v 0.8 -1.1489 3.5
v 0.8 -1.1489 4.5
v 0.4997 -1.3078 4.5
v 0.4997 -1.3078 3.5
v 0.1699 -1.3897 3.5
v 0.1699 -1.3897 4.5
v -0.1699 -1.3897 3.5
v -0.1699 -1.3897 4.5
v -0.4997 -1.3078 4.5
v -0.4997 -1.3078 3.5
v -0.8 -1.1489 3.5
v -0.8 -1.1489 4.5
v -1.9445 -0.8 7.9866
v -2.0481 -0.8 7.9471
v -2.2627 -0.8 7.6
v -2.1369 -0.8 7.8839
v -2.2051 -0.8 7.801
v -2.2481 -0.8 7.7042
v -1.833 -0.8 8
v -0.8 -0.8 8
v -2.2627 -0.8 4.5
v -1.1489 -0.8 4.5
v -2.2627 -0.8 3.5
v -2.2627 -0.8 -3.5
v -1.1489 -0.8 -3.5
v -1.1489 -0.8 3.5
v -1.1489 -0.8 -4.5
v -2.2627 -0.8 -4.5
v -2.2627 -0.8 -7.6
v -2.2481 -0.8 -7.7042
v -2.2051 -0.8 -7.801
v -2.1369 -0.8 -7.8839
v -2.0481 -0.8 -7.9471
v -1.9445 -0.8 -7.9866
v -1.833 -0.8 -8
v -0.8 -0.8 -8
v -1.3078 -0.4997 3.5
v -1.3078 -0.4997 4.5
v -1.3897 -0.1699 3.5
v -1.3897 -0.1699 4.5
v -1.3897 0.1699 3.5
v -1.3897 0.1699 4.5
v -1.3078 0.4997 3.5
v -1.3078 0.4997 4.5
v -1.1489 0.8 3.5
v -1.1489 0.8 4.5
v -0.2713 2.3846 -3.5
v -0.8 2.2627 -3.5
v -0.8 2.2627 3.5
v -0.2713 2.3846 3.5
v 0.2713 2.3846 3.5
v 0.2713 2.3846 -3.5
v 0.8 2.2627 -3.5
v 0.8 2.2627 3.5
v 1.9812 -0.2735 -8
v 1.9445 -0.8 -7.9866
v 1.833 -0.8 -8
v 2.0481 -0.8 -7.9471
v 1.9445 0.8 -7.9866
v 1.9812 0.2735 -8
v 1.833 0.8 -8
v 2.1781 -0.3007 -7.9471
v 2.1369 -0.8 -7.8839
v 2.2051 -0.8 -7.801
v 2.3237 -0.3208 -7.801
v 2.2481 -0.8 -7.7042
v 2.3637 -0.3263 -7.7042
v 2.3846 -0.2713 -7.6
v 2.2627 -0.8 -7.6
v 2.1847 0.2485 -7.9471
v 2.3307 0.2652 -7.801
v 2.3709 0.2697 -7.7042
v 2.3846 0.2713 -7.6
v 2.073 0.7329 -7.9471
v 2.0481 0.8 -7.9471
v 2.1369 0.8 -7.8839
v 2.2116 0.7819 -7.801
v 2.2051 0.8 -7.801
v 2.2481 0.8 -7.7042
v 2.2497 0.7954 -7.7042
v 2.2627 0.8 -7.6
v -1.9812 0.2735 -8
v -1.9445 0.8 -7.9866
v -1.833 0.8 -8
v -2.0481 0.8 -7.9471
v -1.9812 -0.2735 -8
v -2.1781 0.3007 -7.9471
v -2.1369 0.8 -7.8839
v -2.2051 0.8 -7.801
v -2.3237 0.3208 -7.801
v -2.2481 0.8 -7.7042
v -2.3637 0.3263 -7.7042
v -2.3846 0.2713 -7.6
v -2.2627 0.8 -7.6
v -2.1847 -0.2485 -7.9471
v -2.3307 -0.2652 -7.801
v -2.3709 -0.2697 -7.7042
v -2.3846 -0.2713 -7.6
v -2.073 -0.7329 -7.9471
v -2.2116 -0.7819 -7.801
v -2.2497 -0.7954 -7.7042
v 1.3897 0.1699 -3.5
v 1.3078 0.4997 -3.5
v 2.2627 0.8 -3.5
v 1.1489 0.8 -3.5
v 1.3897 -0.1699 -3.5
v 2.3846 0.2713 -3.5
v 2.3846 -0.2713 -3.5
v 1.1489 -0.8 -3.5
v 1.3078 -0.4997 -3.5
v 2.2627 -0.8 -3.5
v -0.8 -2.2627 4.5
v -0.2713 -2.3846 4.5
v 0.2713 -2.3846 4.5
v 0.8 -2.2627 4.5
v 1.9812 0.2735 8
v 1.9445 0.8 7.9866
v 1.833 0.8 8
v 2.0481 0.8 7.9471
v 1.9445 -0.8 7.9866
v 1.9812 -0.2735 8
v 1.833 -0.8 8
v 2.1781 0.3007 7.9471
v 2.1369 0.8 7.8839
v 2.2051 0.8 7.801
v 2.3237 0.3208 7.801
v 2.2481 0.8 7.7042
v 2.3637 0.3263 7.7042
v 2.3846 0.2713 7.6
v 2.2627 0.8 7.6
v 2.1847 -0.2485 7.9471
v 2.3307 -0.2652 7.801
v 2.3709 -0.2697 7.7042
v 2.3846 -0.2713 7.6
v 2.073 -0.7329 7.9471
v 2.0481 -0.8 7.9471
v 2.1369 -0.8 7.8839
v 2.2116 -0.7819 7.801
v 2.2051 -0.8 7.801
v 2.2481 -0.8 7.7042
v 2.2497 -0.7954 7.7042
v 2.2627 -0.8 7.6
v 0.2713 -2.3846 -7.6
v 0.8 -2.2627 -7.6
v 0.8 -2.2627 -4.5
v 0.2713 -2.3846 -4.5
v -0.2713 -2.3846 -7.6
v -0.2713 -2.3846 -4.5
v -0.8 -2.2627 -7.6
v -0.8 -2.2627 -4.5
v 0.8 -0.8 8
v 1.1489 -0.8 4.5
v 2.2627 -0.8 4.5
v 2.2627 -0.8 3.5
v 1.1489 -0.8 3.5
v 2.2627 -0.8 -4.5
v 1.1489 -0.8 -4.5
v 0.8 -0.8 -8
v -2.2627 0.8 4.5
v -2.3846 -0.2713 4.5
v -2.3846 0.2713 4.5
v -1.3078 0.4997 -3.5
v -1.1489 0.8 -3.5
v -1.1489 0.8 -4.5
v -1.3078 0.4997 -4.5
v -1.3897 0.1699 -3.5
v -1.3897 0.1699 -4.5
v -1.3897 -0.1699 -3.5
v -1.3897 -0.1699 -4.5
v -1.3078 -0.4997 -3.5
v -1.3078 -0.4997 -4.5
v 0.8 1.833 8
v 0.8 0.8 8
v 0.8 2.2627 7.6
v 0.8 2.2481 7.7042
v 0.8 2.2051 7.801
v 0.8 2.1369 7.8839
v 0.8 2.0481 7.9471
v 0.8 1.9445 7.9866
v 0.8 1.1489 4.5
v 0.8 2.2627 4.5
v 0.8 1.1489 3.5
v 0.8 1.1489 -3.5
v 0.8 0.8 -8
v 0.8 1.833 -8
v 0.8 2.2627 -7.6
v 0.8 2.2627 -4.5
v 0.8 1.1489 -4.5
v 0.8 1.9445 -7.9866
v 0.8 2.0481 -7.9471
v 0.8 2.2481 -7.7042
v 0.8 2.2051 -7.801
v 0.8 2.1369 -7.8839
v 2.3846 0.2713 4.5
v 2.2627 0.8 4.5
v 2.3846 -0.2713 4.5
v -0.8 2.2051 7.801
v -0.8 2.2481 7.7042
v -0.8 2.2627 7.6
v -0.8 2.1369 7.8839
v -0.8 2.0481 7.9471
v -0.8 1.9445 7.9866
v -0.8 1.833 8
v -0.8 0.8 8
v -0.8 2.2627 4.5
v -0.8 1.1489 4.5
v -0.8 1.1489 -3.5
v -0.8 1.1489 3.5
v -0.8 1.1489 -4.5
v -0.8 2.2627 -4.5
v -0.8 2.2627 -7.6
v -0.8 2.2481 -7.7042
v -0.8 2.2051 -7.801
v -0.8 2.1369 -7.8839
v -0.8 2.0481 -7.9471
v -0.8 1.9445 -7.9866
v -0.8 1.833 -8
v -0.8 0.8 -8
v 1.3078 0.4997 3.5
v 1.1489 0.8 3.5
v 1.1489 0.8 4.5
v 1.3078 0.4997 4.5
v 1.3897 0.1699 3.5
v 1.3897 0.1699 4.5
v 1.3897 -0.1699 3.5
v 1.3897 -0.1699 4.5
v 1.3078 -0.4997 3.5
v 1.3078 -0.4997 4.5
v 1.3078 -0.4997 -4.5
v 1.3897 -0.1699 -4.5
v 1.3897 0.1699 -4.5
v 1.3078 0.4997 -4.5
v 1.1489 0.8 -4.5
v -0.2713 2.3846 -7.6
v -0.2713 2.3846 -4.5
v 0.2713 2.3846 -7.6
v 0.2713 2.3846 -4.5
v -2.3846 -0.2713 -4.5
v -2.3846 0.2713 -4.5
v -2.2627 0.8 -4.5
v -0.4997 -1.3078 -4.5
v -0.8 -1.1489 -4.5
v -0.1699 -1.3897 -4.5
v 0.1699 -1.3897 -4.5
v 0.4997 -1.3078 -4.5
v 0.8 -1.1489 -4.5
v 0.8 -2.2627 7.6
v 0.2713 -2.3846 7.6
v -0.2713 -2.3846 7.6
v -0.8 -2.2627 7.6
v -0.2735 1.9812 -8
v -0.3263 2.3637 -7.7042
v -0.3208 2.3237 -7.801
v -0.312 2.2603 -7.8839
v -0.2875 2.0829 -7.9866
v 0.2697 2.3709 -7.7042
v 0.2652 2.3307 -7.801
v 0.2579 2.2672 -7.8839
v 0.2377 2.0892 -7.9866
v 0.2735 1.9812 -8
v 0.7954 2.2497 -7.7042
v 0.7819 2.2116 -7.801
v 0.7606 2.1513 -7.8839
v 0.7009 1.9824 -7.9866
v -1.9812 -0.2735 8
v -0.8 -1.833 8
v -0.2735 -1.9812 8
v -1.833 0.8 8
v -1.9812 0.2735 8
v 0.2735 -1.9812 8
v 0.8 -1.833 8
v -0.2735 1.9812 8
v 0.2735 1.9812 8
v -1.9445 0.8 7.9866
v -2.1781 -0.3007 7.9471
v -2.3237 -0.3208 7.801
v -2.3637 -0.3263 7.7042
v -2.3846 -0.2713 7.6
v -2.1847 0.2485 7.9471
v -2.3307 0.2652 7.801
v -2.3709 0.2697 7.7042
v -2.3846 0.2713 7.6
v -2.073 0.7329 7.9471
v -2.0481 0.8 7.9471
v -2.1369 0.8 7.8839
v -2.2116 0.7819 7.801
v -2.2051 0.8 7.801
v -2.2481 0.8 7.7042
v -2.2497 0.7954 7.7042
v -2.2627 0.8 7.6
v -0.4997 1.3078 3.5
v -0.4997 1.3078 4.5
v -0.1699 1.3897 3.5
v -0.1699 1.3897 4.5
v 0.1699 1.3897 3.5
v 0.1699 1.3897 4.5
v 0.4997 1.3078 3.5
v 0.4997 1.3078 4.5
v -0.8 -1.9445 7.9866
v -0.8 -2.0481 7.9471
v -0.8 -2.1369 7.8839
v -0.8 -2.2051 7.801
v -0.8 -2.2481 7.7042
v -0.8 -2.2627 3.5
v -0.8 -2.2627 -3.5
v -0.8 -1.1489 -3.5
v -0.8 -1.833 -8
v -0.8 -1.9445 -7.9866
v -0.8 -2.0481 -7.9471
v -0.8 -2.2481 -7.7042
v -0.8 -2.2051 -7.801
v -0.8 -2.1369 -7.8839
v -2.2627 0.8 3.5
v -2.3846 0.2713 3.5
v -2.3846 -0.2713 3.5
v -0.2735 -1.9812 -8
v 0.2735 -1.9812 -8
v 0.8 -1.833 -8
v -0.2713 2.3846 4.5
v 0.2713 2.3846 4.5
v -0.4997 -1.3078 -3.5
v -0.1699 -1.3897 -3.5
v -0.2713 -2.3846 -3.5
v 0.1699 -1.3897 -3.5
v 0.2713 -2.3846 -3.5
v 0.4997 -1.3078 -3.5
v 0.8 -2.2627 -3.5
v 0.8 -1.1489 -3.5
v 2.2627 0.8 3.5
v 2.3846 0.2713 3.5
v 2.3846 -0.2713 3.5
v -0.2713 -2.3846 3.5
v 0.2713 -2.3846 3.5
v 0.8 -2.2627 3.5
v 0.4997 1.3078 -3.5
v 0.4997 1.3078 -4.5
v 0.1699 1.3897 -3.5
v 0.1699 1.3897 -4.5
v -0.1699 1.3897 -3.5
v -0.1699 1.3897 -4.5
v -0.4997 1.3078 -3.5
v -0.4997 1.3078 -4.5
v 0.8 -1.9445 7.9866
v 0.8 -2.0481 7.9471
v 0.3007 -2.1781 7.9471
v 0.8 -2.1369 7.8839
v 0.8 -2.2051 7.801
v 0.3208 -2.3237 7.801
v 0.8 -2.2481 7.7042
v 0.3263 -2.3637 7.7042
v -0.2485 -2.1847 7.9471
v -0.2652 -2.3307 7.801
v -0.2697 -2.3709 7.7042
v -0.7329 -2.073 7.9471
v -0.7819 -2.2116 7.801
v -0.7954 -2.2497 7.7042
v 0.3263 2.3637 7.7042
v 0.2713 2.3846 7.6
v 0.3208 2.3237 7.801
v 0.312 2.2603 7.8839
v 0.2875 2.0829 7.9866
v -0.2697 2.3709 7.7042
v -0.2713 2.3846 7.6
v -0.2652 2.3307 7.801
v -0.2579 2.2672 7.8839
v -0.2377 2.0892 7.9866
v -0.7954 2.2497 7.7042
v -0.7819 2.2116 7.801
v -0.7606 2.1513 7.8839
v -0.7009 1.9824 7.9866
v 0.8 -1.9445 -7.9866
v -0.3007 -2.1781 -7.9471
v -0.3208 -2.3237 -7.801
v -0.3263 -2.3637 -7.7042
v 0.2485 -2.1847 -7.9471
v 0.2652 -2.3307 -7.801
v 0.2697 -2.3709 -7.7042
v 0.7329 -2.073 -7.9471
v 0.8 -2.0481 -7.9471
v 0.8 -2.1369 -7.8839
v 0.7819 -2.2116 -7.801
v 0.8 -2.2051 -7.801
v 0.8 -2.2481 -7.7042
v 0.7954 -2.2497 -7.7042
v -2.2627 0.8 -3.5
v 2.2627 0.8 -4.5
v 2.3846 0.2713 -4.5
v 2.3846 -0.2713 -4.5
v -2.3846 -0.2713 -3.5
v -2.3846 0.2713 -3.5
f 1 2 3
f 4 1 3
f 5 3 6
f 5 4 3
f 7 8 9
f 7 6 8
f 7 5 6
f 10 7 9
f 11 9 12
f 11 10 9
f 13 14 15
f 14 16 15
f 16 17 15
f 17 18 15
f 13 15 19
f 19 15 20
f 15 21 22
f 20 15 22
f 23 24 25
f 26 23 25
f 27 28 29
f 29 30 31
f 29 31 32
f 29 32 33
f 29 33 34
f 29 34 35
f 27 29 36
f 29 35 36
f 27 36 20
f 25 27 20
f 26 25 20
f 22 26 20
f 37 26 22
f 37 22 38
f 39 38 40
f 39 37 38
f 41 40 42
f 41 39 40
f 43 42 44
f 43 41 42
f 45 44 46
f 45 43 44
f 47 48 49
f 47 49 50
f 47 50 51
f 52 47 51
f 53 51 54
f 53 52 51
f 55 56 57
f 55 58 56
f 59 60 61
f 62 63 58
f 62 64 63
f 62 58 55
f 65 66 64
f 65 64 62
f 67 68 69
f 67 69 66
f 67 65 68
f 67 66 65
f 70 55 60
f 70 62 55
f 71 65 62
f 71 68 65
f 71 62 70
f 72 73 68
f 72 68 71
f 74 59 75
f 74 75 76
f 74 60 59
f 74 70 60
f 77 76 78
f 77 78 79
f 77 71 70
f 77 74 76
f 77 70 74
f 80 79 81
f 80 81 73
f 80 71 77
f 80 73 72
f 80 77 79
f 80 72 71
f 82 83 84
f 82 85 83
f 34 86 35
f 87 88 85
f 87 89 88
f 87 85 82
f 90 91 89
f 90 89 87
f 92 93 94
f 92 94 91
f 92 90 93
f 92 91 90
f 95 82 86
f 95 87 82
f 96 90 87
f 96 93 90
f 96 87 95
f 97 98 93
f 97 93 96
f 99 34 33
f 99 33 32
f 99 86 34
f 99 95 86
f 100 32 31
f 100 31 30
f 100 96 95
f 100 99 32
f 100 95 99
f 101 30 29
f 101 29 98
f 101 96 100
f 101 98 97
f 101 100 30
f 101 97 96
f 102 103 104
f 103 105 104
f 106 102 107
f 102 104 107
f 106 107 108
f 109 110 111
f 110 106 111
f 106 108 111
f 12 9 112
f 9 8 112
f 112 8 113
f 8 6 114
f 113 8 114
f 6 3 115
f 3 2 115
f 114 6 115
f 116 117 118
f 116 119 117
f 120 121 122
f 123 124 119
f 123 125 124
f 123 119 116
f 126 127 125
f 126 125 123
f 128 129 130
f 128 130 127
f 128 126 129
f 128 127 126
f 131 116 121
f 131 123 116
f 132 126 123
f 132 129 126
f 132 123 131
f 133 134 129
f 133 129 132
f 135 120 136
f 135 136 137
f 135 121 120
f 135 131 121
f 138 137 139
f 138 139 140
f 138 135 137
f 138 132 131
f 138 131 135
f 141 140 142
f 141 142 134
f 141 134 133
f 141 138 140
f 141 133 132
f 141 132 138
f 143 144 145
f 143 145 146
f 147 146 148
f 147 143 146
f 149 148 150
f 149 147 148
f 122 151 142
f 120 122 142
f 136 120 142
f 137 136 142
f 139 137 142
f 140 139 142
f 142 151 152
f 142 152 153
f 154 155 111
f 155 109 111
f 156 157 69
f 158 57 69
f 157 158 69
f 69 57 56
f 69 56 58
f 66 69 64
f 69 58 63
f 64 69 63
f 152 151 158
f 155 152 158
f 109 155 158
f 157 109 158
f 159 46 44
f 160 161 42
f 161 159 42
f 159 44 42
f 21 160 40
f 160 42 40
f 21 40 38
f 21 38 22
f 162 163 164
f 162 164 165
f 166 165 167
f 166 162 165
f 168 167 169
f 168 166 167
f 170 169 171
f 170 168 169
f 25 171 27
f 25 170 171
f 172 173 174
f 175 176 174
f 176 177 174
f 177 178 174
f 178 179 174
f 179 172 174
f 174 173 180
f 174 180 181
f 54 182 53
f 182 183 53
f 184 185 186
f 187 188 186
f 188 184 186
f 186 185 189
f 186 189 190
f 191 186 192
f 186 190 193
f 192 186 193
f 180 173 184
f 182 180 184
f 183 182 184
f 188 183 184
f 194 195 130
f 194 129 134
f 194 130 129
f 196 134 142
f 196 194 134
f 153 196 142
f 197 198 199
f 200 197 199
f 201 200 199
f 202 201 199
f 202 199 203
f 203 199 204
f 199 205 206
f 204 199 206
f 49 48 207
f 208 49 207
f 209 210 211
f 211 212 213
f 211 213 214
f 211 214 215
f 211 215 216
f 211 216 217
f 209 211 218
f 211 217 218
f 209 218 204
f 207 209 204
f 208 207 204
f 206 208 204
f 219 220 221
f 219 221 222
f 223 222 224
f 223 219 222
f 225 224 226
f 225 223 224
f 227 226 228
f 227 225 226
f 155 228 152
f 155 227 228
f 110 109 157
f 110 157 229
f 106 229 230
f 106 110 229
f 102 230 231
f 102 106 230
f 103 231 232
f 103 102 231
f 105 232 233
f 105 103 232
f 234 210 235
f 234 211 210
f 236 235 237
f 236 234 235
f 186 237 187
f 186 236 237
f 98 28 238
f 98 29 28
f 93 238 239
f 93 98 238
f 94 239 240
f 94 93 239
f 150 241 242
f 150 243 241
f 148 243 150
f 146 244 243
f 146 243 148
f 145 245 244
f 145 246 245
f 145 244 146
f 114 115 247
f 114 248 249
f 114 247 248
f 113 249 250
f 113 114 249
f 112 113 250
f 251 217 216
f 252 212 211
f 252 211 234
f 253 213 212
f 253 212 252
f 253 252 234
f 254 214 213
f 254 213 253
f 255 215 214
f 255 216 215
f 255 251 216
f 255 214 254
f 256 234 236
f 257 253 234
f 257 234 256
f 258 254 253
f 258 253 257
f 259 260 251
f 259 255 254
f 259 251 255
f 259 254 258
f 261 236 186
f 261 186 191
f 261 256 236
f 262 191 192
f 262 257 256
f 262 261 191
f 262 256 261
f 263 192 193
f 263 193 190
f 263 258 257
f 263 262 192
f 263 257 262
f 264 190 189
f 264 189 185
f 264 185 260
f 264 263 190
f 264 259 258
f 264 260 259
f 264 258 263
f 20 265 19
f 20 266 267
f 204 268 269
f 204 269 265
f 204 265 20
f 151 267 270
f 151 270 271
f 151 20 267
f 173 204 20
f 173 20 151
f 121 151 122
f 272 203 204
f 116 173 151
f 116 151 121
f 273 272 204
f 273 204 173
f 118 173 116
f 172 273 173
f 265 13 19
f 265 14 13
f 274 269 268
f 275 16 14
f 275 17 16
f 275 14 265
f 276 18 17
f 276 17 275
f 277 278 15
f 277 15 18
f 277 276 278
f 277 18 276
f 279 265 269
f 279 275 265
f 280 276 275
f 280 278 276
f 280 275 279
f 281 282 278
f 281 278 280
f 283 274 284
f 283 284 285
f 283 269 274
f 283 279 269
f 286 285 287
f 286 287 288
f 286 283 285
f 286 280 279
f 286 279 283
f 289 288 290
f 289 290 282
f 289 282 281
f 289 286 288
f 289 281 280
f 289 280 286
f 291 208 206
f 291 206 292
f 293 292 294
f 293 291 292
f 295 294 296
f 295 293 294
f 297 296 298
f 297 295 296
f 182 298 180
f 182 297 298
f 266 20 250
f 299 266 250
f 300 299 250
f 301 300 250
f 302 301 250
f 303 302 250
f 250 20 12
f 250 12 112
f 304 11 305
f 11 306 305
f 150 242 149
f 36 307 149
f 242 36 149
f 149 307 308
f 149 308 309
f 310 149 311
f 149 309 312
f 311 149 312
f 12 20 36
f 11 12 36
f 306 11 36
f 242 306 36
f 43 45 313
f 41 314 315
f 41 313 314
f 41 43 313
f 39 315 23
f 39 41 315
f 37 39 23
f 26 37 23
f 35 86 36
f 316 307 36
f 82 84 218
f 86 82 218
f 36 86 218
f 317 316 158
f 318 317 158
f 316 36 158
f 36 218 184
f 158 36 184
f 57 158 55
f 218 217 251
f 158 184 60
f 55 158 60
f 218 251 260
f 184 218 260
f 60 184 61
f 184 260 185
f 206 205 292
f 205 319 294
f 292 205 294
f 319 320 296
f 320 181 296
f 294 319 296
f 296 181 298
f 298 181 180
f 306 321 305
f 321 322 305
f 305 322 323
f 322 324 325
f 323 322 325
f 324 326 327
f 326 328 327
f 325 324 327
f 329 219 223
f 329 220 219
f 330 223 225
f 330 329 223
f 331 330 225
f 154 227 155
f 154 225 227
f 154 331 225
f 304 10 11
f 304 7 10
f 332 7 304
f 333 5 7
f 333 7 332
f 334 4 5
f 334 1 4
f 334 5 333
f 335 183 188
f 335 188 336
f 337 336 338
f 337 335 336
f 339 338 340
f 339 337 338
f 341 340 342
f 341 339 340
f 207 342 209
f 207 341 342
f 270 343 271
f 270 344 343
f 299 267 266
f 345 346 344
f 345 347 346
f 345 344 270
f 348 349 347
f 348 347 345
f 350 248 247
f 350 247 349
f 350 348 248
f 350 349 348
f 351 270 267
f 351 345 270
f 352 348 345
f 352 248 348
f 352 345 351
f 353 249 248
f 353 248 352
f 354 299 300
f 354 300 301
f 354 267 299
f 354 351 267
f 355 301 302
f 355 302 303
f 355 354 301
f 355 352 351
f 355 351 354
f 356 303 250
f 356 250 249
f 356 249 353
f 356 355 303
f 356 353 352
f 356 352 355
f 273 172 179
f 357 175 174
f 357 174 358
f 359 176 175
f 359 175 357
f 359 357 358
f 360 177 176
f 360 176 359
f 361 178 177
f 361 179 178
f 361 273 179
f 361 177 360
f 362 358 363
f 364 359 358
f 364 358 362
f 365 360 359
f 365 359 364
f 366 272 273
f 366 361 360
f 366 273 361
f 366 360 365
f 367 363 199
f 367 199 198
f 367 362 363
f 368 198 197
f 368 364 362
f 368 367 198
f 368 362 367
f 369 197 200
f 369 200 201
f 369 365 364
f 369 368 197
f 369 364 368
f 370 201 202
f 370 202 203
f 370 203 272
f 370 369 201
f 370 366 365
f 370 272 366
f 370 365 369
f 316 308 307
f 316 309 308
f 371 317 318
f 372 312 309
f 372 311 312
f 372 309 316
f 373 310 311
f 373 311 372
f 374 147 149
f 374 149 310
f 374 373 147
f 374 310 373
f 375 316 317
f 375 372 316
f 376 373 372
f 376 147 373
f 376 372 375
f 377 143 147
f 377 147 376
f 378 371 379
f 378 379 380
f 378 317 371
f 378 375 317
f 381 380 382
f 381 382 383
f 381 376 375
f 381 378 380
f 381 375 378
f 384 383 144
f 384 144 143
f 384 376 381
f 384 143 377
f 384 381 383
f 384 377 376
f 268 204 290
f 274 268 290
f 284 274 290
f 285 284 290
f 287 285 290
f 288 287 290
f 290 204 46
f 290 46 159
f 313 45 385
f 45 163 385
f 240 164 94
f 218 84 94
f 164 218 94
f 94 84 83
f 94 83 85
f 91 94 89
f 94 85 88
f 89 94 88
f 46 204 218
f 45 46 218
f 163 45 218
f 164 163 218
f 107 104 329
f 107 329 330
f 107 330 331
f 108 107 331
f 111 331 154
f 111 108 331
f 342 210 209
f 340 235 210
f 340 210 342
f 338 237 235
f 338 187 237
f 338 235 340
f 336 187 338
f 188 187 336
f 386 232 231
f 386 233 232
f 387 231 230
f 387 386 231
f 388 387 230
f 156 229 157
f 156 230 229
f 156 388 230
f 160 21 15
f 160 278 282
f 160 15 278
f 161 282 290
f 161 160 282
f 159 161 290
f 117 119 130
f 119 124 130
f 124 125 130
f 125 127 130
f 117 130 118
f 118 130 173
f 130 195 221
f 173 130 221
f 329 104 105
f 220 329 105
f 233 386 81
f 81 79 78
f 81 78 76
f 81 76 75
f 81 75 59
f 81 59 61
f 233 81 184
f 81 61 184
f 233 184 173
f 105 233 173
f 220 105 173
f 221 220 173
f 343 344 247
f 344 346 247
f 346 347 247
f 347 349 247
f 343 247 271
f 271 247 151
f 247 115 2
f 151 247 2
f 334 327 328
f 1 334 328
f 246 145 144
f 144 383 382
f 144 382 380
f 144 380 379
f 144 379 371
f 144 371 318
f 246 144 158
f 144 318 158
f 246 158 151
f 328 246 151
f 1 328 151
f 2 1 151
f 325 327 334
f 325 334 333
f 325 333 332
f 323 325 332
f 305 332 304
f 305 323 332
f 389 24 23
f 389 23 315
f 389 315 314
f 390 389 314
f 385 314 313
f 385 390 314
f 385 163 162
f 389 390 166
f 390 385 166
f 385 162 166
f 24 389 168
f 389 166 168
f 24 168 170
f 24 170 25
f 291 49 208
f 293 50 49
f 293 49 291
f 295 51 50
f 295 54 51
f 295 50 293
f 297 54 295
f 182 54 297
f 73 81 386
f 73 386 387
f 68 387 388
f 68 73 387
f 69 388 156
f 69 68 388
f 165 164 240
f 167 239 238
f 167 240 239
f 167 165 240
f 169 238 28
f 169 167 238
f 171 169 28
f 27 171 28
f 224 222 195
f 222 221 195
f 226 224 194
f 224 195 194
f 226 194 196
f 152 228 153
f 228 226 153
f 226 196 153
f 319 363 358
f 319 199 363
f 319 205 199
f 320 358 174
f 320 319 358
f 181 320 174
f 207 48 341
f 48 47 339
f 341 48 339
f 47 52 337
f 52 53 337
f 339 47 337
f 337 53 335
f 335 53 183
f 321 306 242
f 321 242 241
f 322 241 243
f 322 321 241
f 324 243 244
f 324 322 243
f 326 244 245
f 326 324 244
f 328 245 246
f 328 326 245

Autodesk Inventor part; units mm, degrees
ref_plane "YZ Plane" through (0, 0, 0) normal (1, 0, 0) x (0, 1, 0)
ref_plane "XZ Plane" through (0, 0, 0) normal (0, 1, 0) x (-1, 0, 0)
ref_plane "XY Plane" through (0, 0, 0) normal (0, 0, 1) x (1, 0, 0)
sketch "Sketch1" plane through (0, 0, 0) normal (0, 0, 1) x (1, 0, 0)
  circle A0 centre (0, 0) radius 2.4 construction
  line L0 (-0.8, 2.2627) -> (-0.8, 0.8)
  line L1 (-0.8, 0.8) -> (-2.2627, 0.8)
  line L2 (-2.2627, -0.8) -> (-0.8, -0.8)
  line L3 (-0.8, -0.8) -> (-0.8, -2.2627)
  line L4 (0.8, -2.2627) -> (0.8, -0.8)
  line L5 (0.8, -0.8) -> (2.2627, -0.8)
  line L6 (2.2627, 0.8) -> (0.8, 0.8)
  line L7 (0.8, 0.8) -> (0.8, 2.2627)
  arc A1 (0.8, 2.2627) -> (-0.8, 2.2627) centre (0, 0) ccw
  arc A2 (-2.2627, 0.8) -> (-2.2627, -0.8) centre (0, 0) ccw
  arc A3 (-0.8, -2.2627) -> (0.8, -2.2627) centre (0, 0) ccw
  arc A4 (2.2627, -0.8) -> (2.2627, 0.8) centre (0, 0) ccw
  dimension "d0" = 4.8
  dimension "d1" = 1.6
extrude "Extrusion1" add sketch "Sketch1" along normal mid plane 16
fillet "Fillet1" radius 0.4 8 edges at (0, 2.4, 8) (-2.4, 0, 8) (0, -2.4, 8) (2.4, 0, 8) (2.4, 0, -8) (0, 2.4, -8) (-2.4, 0, -8) (0, -2.4, -8)
sketch "Sketch2" plane through (0, 0, 0) normal (1, 0, 0) x (0, 1, 0)
  line L0 (-2.4, -7.6) -> (-2.4, 7.6) projected
  line L1 (0, -10.64) -> (0, 10.64) projected
  line L2 (-2.4, 4.5) -> (-1.4, 4.5)
  line L3 (-1.4, 4.5) -> (-1.4, 3.5)
  line L4 (-1.4, 3.5) -> (-2.4, 3.5)
  line L5 (-2.4, 3.5) -> (-2.4, 4.5)
  line L6 (-2.4, -4.5) -> (-1.4, -4.5)
  line L7 (-1.4, -4.5) -> (-1.4, -3.5)
  line L8 (-1.4, -3.5) -> (-2.4, -3.5)
  line L9 (-2.4, -3.5) -> (-2.4, -4.5)
  line L10 (-1.4, 3.5) -> (-1.4, -3.5) construction
  point P0 (0, 0)
  point P1 (-2.4, 4)
  point P2 (-2.4, -4)
  point P3 (-1.4, 0)
  dimension "d7" = 8
  dimension "d8" = 1
revolve "Revolution1" cut sketch "Sketch2" angle 360 about axis through (0, 0, -10) along (0, 0, 1)
equation "\"d0\" = kd"
equation "\"d1\" = axlet"
equation "\"d2\" = 2 * lu"
equation "\"d4\" = tf"
equation "\"d7\" = lu"
equation "\"kd\" = 4.8"
equation "\"axlet\" = 1.6"
equation "\"lu\" = 8"
equation "\"tf\" = 0.4"
properties part number "32062-Red" material "ABS Plastic"
